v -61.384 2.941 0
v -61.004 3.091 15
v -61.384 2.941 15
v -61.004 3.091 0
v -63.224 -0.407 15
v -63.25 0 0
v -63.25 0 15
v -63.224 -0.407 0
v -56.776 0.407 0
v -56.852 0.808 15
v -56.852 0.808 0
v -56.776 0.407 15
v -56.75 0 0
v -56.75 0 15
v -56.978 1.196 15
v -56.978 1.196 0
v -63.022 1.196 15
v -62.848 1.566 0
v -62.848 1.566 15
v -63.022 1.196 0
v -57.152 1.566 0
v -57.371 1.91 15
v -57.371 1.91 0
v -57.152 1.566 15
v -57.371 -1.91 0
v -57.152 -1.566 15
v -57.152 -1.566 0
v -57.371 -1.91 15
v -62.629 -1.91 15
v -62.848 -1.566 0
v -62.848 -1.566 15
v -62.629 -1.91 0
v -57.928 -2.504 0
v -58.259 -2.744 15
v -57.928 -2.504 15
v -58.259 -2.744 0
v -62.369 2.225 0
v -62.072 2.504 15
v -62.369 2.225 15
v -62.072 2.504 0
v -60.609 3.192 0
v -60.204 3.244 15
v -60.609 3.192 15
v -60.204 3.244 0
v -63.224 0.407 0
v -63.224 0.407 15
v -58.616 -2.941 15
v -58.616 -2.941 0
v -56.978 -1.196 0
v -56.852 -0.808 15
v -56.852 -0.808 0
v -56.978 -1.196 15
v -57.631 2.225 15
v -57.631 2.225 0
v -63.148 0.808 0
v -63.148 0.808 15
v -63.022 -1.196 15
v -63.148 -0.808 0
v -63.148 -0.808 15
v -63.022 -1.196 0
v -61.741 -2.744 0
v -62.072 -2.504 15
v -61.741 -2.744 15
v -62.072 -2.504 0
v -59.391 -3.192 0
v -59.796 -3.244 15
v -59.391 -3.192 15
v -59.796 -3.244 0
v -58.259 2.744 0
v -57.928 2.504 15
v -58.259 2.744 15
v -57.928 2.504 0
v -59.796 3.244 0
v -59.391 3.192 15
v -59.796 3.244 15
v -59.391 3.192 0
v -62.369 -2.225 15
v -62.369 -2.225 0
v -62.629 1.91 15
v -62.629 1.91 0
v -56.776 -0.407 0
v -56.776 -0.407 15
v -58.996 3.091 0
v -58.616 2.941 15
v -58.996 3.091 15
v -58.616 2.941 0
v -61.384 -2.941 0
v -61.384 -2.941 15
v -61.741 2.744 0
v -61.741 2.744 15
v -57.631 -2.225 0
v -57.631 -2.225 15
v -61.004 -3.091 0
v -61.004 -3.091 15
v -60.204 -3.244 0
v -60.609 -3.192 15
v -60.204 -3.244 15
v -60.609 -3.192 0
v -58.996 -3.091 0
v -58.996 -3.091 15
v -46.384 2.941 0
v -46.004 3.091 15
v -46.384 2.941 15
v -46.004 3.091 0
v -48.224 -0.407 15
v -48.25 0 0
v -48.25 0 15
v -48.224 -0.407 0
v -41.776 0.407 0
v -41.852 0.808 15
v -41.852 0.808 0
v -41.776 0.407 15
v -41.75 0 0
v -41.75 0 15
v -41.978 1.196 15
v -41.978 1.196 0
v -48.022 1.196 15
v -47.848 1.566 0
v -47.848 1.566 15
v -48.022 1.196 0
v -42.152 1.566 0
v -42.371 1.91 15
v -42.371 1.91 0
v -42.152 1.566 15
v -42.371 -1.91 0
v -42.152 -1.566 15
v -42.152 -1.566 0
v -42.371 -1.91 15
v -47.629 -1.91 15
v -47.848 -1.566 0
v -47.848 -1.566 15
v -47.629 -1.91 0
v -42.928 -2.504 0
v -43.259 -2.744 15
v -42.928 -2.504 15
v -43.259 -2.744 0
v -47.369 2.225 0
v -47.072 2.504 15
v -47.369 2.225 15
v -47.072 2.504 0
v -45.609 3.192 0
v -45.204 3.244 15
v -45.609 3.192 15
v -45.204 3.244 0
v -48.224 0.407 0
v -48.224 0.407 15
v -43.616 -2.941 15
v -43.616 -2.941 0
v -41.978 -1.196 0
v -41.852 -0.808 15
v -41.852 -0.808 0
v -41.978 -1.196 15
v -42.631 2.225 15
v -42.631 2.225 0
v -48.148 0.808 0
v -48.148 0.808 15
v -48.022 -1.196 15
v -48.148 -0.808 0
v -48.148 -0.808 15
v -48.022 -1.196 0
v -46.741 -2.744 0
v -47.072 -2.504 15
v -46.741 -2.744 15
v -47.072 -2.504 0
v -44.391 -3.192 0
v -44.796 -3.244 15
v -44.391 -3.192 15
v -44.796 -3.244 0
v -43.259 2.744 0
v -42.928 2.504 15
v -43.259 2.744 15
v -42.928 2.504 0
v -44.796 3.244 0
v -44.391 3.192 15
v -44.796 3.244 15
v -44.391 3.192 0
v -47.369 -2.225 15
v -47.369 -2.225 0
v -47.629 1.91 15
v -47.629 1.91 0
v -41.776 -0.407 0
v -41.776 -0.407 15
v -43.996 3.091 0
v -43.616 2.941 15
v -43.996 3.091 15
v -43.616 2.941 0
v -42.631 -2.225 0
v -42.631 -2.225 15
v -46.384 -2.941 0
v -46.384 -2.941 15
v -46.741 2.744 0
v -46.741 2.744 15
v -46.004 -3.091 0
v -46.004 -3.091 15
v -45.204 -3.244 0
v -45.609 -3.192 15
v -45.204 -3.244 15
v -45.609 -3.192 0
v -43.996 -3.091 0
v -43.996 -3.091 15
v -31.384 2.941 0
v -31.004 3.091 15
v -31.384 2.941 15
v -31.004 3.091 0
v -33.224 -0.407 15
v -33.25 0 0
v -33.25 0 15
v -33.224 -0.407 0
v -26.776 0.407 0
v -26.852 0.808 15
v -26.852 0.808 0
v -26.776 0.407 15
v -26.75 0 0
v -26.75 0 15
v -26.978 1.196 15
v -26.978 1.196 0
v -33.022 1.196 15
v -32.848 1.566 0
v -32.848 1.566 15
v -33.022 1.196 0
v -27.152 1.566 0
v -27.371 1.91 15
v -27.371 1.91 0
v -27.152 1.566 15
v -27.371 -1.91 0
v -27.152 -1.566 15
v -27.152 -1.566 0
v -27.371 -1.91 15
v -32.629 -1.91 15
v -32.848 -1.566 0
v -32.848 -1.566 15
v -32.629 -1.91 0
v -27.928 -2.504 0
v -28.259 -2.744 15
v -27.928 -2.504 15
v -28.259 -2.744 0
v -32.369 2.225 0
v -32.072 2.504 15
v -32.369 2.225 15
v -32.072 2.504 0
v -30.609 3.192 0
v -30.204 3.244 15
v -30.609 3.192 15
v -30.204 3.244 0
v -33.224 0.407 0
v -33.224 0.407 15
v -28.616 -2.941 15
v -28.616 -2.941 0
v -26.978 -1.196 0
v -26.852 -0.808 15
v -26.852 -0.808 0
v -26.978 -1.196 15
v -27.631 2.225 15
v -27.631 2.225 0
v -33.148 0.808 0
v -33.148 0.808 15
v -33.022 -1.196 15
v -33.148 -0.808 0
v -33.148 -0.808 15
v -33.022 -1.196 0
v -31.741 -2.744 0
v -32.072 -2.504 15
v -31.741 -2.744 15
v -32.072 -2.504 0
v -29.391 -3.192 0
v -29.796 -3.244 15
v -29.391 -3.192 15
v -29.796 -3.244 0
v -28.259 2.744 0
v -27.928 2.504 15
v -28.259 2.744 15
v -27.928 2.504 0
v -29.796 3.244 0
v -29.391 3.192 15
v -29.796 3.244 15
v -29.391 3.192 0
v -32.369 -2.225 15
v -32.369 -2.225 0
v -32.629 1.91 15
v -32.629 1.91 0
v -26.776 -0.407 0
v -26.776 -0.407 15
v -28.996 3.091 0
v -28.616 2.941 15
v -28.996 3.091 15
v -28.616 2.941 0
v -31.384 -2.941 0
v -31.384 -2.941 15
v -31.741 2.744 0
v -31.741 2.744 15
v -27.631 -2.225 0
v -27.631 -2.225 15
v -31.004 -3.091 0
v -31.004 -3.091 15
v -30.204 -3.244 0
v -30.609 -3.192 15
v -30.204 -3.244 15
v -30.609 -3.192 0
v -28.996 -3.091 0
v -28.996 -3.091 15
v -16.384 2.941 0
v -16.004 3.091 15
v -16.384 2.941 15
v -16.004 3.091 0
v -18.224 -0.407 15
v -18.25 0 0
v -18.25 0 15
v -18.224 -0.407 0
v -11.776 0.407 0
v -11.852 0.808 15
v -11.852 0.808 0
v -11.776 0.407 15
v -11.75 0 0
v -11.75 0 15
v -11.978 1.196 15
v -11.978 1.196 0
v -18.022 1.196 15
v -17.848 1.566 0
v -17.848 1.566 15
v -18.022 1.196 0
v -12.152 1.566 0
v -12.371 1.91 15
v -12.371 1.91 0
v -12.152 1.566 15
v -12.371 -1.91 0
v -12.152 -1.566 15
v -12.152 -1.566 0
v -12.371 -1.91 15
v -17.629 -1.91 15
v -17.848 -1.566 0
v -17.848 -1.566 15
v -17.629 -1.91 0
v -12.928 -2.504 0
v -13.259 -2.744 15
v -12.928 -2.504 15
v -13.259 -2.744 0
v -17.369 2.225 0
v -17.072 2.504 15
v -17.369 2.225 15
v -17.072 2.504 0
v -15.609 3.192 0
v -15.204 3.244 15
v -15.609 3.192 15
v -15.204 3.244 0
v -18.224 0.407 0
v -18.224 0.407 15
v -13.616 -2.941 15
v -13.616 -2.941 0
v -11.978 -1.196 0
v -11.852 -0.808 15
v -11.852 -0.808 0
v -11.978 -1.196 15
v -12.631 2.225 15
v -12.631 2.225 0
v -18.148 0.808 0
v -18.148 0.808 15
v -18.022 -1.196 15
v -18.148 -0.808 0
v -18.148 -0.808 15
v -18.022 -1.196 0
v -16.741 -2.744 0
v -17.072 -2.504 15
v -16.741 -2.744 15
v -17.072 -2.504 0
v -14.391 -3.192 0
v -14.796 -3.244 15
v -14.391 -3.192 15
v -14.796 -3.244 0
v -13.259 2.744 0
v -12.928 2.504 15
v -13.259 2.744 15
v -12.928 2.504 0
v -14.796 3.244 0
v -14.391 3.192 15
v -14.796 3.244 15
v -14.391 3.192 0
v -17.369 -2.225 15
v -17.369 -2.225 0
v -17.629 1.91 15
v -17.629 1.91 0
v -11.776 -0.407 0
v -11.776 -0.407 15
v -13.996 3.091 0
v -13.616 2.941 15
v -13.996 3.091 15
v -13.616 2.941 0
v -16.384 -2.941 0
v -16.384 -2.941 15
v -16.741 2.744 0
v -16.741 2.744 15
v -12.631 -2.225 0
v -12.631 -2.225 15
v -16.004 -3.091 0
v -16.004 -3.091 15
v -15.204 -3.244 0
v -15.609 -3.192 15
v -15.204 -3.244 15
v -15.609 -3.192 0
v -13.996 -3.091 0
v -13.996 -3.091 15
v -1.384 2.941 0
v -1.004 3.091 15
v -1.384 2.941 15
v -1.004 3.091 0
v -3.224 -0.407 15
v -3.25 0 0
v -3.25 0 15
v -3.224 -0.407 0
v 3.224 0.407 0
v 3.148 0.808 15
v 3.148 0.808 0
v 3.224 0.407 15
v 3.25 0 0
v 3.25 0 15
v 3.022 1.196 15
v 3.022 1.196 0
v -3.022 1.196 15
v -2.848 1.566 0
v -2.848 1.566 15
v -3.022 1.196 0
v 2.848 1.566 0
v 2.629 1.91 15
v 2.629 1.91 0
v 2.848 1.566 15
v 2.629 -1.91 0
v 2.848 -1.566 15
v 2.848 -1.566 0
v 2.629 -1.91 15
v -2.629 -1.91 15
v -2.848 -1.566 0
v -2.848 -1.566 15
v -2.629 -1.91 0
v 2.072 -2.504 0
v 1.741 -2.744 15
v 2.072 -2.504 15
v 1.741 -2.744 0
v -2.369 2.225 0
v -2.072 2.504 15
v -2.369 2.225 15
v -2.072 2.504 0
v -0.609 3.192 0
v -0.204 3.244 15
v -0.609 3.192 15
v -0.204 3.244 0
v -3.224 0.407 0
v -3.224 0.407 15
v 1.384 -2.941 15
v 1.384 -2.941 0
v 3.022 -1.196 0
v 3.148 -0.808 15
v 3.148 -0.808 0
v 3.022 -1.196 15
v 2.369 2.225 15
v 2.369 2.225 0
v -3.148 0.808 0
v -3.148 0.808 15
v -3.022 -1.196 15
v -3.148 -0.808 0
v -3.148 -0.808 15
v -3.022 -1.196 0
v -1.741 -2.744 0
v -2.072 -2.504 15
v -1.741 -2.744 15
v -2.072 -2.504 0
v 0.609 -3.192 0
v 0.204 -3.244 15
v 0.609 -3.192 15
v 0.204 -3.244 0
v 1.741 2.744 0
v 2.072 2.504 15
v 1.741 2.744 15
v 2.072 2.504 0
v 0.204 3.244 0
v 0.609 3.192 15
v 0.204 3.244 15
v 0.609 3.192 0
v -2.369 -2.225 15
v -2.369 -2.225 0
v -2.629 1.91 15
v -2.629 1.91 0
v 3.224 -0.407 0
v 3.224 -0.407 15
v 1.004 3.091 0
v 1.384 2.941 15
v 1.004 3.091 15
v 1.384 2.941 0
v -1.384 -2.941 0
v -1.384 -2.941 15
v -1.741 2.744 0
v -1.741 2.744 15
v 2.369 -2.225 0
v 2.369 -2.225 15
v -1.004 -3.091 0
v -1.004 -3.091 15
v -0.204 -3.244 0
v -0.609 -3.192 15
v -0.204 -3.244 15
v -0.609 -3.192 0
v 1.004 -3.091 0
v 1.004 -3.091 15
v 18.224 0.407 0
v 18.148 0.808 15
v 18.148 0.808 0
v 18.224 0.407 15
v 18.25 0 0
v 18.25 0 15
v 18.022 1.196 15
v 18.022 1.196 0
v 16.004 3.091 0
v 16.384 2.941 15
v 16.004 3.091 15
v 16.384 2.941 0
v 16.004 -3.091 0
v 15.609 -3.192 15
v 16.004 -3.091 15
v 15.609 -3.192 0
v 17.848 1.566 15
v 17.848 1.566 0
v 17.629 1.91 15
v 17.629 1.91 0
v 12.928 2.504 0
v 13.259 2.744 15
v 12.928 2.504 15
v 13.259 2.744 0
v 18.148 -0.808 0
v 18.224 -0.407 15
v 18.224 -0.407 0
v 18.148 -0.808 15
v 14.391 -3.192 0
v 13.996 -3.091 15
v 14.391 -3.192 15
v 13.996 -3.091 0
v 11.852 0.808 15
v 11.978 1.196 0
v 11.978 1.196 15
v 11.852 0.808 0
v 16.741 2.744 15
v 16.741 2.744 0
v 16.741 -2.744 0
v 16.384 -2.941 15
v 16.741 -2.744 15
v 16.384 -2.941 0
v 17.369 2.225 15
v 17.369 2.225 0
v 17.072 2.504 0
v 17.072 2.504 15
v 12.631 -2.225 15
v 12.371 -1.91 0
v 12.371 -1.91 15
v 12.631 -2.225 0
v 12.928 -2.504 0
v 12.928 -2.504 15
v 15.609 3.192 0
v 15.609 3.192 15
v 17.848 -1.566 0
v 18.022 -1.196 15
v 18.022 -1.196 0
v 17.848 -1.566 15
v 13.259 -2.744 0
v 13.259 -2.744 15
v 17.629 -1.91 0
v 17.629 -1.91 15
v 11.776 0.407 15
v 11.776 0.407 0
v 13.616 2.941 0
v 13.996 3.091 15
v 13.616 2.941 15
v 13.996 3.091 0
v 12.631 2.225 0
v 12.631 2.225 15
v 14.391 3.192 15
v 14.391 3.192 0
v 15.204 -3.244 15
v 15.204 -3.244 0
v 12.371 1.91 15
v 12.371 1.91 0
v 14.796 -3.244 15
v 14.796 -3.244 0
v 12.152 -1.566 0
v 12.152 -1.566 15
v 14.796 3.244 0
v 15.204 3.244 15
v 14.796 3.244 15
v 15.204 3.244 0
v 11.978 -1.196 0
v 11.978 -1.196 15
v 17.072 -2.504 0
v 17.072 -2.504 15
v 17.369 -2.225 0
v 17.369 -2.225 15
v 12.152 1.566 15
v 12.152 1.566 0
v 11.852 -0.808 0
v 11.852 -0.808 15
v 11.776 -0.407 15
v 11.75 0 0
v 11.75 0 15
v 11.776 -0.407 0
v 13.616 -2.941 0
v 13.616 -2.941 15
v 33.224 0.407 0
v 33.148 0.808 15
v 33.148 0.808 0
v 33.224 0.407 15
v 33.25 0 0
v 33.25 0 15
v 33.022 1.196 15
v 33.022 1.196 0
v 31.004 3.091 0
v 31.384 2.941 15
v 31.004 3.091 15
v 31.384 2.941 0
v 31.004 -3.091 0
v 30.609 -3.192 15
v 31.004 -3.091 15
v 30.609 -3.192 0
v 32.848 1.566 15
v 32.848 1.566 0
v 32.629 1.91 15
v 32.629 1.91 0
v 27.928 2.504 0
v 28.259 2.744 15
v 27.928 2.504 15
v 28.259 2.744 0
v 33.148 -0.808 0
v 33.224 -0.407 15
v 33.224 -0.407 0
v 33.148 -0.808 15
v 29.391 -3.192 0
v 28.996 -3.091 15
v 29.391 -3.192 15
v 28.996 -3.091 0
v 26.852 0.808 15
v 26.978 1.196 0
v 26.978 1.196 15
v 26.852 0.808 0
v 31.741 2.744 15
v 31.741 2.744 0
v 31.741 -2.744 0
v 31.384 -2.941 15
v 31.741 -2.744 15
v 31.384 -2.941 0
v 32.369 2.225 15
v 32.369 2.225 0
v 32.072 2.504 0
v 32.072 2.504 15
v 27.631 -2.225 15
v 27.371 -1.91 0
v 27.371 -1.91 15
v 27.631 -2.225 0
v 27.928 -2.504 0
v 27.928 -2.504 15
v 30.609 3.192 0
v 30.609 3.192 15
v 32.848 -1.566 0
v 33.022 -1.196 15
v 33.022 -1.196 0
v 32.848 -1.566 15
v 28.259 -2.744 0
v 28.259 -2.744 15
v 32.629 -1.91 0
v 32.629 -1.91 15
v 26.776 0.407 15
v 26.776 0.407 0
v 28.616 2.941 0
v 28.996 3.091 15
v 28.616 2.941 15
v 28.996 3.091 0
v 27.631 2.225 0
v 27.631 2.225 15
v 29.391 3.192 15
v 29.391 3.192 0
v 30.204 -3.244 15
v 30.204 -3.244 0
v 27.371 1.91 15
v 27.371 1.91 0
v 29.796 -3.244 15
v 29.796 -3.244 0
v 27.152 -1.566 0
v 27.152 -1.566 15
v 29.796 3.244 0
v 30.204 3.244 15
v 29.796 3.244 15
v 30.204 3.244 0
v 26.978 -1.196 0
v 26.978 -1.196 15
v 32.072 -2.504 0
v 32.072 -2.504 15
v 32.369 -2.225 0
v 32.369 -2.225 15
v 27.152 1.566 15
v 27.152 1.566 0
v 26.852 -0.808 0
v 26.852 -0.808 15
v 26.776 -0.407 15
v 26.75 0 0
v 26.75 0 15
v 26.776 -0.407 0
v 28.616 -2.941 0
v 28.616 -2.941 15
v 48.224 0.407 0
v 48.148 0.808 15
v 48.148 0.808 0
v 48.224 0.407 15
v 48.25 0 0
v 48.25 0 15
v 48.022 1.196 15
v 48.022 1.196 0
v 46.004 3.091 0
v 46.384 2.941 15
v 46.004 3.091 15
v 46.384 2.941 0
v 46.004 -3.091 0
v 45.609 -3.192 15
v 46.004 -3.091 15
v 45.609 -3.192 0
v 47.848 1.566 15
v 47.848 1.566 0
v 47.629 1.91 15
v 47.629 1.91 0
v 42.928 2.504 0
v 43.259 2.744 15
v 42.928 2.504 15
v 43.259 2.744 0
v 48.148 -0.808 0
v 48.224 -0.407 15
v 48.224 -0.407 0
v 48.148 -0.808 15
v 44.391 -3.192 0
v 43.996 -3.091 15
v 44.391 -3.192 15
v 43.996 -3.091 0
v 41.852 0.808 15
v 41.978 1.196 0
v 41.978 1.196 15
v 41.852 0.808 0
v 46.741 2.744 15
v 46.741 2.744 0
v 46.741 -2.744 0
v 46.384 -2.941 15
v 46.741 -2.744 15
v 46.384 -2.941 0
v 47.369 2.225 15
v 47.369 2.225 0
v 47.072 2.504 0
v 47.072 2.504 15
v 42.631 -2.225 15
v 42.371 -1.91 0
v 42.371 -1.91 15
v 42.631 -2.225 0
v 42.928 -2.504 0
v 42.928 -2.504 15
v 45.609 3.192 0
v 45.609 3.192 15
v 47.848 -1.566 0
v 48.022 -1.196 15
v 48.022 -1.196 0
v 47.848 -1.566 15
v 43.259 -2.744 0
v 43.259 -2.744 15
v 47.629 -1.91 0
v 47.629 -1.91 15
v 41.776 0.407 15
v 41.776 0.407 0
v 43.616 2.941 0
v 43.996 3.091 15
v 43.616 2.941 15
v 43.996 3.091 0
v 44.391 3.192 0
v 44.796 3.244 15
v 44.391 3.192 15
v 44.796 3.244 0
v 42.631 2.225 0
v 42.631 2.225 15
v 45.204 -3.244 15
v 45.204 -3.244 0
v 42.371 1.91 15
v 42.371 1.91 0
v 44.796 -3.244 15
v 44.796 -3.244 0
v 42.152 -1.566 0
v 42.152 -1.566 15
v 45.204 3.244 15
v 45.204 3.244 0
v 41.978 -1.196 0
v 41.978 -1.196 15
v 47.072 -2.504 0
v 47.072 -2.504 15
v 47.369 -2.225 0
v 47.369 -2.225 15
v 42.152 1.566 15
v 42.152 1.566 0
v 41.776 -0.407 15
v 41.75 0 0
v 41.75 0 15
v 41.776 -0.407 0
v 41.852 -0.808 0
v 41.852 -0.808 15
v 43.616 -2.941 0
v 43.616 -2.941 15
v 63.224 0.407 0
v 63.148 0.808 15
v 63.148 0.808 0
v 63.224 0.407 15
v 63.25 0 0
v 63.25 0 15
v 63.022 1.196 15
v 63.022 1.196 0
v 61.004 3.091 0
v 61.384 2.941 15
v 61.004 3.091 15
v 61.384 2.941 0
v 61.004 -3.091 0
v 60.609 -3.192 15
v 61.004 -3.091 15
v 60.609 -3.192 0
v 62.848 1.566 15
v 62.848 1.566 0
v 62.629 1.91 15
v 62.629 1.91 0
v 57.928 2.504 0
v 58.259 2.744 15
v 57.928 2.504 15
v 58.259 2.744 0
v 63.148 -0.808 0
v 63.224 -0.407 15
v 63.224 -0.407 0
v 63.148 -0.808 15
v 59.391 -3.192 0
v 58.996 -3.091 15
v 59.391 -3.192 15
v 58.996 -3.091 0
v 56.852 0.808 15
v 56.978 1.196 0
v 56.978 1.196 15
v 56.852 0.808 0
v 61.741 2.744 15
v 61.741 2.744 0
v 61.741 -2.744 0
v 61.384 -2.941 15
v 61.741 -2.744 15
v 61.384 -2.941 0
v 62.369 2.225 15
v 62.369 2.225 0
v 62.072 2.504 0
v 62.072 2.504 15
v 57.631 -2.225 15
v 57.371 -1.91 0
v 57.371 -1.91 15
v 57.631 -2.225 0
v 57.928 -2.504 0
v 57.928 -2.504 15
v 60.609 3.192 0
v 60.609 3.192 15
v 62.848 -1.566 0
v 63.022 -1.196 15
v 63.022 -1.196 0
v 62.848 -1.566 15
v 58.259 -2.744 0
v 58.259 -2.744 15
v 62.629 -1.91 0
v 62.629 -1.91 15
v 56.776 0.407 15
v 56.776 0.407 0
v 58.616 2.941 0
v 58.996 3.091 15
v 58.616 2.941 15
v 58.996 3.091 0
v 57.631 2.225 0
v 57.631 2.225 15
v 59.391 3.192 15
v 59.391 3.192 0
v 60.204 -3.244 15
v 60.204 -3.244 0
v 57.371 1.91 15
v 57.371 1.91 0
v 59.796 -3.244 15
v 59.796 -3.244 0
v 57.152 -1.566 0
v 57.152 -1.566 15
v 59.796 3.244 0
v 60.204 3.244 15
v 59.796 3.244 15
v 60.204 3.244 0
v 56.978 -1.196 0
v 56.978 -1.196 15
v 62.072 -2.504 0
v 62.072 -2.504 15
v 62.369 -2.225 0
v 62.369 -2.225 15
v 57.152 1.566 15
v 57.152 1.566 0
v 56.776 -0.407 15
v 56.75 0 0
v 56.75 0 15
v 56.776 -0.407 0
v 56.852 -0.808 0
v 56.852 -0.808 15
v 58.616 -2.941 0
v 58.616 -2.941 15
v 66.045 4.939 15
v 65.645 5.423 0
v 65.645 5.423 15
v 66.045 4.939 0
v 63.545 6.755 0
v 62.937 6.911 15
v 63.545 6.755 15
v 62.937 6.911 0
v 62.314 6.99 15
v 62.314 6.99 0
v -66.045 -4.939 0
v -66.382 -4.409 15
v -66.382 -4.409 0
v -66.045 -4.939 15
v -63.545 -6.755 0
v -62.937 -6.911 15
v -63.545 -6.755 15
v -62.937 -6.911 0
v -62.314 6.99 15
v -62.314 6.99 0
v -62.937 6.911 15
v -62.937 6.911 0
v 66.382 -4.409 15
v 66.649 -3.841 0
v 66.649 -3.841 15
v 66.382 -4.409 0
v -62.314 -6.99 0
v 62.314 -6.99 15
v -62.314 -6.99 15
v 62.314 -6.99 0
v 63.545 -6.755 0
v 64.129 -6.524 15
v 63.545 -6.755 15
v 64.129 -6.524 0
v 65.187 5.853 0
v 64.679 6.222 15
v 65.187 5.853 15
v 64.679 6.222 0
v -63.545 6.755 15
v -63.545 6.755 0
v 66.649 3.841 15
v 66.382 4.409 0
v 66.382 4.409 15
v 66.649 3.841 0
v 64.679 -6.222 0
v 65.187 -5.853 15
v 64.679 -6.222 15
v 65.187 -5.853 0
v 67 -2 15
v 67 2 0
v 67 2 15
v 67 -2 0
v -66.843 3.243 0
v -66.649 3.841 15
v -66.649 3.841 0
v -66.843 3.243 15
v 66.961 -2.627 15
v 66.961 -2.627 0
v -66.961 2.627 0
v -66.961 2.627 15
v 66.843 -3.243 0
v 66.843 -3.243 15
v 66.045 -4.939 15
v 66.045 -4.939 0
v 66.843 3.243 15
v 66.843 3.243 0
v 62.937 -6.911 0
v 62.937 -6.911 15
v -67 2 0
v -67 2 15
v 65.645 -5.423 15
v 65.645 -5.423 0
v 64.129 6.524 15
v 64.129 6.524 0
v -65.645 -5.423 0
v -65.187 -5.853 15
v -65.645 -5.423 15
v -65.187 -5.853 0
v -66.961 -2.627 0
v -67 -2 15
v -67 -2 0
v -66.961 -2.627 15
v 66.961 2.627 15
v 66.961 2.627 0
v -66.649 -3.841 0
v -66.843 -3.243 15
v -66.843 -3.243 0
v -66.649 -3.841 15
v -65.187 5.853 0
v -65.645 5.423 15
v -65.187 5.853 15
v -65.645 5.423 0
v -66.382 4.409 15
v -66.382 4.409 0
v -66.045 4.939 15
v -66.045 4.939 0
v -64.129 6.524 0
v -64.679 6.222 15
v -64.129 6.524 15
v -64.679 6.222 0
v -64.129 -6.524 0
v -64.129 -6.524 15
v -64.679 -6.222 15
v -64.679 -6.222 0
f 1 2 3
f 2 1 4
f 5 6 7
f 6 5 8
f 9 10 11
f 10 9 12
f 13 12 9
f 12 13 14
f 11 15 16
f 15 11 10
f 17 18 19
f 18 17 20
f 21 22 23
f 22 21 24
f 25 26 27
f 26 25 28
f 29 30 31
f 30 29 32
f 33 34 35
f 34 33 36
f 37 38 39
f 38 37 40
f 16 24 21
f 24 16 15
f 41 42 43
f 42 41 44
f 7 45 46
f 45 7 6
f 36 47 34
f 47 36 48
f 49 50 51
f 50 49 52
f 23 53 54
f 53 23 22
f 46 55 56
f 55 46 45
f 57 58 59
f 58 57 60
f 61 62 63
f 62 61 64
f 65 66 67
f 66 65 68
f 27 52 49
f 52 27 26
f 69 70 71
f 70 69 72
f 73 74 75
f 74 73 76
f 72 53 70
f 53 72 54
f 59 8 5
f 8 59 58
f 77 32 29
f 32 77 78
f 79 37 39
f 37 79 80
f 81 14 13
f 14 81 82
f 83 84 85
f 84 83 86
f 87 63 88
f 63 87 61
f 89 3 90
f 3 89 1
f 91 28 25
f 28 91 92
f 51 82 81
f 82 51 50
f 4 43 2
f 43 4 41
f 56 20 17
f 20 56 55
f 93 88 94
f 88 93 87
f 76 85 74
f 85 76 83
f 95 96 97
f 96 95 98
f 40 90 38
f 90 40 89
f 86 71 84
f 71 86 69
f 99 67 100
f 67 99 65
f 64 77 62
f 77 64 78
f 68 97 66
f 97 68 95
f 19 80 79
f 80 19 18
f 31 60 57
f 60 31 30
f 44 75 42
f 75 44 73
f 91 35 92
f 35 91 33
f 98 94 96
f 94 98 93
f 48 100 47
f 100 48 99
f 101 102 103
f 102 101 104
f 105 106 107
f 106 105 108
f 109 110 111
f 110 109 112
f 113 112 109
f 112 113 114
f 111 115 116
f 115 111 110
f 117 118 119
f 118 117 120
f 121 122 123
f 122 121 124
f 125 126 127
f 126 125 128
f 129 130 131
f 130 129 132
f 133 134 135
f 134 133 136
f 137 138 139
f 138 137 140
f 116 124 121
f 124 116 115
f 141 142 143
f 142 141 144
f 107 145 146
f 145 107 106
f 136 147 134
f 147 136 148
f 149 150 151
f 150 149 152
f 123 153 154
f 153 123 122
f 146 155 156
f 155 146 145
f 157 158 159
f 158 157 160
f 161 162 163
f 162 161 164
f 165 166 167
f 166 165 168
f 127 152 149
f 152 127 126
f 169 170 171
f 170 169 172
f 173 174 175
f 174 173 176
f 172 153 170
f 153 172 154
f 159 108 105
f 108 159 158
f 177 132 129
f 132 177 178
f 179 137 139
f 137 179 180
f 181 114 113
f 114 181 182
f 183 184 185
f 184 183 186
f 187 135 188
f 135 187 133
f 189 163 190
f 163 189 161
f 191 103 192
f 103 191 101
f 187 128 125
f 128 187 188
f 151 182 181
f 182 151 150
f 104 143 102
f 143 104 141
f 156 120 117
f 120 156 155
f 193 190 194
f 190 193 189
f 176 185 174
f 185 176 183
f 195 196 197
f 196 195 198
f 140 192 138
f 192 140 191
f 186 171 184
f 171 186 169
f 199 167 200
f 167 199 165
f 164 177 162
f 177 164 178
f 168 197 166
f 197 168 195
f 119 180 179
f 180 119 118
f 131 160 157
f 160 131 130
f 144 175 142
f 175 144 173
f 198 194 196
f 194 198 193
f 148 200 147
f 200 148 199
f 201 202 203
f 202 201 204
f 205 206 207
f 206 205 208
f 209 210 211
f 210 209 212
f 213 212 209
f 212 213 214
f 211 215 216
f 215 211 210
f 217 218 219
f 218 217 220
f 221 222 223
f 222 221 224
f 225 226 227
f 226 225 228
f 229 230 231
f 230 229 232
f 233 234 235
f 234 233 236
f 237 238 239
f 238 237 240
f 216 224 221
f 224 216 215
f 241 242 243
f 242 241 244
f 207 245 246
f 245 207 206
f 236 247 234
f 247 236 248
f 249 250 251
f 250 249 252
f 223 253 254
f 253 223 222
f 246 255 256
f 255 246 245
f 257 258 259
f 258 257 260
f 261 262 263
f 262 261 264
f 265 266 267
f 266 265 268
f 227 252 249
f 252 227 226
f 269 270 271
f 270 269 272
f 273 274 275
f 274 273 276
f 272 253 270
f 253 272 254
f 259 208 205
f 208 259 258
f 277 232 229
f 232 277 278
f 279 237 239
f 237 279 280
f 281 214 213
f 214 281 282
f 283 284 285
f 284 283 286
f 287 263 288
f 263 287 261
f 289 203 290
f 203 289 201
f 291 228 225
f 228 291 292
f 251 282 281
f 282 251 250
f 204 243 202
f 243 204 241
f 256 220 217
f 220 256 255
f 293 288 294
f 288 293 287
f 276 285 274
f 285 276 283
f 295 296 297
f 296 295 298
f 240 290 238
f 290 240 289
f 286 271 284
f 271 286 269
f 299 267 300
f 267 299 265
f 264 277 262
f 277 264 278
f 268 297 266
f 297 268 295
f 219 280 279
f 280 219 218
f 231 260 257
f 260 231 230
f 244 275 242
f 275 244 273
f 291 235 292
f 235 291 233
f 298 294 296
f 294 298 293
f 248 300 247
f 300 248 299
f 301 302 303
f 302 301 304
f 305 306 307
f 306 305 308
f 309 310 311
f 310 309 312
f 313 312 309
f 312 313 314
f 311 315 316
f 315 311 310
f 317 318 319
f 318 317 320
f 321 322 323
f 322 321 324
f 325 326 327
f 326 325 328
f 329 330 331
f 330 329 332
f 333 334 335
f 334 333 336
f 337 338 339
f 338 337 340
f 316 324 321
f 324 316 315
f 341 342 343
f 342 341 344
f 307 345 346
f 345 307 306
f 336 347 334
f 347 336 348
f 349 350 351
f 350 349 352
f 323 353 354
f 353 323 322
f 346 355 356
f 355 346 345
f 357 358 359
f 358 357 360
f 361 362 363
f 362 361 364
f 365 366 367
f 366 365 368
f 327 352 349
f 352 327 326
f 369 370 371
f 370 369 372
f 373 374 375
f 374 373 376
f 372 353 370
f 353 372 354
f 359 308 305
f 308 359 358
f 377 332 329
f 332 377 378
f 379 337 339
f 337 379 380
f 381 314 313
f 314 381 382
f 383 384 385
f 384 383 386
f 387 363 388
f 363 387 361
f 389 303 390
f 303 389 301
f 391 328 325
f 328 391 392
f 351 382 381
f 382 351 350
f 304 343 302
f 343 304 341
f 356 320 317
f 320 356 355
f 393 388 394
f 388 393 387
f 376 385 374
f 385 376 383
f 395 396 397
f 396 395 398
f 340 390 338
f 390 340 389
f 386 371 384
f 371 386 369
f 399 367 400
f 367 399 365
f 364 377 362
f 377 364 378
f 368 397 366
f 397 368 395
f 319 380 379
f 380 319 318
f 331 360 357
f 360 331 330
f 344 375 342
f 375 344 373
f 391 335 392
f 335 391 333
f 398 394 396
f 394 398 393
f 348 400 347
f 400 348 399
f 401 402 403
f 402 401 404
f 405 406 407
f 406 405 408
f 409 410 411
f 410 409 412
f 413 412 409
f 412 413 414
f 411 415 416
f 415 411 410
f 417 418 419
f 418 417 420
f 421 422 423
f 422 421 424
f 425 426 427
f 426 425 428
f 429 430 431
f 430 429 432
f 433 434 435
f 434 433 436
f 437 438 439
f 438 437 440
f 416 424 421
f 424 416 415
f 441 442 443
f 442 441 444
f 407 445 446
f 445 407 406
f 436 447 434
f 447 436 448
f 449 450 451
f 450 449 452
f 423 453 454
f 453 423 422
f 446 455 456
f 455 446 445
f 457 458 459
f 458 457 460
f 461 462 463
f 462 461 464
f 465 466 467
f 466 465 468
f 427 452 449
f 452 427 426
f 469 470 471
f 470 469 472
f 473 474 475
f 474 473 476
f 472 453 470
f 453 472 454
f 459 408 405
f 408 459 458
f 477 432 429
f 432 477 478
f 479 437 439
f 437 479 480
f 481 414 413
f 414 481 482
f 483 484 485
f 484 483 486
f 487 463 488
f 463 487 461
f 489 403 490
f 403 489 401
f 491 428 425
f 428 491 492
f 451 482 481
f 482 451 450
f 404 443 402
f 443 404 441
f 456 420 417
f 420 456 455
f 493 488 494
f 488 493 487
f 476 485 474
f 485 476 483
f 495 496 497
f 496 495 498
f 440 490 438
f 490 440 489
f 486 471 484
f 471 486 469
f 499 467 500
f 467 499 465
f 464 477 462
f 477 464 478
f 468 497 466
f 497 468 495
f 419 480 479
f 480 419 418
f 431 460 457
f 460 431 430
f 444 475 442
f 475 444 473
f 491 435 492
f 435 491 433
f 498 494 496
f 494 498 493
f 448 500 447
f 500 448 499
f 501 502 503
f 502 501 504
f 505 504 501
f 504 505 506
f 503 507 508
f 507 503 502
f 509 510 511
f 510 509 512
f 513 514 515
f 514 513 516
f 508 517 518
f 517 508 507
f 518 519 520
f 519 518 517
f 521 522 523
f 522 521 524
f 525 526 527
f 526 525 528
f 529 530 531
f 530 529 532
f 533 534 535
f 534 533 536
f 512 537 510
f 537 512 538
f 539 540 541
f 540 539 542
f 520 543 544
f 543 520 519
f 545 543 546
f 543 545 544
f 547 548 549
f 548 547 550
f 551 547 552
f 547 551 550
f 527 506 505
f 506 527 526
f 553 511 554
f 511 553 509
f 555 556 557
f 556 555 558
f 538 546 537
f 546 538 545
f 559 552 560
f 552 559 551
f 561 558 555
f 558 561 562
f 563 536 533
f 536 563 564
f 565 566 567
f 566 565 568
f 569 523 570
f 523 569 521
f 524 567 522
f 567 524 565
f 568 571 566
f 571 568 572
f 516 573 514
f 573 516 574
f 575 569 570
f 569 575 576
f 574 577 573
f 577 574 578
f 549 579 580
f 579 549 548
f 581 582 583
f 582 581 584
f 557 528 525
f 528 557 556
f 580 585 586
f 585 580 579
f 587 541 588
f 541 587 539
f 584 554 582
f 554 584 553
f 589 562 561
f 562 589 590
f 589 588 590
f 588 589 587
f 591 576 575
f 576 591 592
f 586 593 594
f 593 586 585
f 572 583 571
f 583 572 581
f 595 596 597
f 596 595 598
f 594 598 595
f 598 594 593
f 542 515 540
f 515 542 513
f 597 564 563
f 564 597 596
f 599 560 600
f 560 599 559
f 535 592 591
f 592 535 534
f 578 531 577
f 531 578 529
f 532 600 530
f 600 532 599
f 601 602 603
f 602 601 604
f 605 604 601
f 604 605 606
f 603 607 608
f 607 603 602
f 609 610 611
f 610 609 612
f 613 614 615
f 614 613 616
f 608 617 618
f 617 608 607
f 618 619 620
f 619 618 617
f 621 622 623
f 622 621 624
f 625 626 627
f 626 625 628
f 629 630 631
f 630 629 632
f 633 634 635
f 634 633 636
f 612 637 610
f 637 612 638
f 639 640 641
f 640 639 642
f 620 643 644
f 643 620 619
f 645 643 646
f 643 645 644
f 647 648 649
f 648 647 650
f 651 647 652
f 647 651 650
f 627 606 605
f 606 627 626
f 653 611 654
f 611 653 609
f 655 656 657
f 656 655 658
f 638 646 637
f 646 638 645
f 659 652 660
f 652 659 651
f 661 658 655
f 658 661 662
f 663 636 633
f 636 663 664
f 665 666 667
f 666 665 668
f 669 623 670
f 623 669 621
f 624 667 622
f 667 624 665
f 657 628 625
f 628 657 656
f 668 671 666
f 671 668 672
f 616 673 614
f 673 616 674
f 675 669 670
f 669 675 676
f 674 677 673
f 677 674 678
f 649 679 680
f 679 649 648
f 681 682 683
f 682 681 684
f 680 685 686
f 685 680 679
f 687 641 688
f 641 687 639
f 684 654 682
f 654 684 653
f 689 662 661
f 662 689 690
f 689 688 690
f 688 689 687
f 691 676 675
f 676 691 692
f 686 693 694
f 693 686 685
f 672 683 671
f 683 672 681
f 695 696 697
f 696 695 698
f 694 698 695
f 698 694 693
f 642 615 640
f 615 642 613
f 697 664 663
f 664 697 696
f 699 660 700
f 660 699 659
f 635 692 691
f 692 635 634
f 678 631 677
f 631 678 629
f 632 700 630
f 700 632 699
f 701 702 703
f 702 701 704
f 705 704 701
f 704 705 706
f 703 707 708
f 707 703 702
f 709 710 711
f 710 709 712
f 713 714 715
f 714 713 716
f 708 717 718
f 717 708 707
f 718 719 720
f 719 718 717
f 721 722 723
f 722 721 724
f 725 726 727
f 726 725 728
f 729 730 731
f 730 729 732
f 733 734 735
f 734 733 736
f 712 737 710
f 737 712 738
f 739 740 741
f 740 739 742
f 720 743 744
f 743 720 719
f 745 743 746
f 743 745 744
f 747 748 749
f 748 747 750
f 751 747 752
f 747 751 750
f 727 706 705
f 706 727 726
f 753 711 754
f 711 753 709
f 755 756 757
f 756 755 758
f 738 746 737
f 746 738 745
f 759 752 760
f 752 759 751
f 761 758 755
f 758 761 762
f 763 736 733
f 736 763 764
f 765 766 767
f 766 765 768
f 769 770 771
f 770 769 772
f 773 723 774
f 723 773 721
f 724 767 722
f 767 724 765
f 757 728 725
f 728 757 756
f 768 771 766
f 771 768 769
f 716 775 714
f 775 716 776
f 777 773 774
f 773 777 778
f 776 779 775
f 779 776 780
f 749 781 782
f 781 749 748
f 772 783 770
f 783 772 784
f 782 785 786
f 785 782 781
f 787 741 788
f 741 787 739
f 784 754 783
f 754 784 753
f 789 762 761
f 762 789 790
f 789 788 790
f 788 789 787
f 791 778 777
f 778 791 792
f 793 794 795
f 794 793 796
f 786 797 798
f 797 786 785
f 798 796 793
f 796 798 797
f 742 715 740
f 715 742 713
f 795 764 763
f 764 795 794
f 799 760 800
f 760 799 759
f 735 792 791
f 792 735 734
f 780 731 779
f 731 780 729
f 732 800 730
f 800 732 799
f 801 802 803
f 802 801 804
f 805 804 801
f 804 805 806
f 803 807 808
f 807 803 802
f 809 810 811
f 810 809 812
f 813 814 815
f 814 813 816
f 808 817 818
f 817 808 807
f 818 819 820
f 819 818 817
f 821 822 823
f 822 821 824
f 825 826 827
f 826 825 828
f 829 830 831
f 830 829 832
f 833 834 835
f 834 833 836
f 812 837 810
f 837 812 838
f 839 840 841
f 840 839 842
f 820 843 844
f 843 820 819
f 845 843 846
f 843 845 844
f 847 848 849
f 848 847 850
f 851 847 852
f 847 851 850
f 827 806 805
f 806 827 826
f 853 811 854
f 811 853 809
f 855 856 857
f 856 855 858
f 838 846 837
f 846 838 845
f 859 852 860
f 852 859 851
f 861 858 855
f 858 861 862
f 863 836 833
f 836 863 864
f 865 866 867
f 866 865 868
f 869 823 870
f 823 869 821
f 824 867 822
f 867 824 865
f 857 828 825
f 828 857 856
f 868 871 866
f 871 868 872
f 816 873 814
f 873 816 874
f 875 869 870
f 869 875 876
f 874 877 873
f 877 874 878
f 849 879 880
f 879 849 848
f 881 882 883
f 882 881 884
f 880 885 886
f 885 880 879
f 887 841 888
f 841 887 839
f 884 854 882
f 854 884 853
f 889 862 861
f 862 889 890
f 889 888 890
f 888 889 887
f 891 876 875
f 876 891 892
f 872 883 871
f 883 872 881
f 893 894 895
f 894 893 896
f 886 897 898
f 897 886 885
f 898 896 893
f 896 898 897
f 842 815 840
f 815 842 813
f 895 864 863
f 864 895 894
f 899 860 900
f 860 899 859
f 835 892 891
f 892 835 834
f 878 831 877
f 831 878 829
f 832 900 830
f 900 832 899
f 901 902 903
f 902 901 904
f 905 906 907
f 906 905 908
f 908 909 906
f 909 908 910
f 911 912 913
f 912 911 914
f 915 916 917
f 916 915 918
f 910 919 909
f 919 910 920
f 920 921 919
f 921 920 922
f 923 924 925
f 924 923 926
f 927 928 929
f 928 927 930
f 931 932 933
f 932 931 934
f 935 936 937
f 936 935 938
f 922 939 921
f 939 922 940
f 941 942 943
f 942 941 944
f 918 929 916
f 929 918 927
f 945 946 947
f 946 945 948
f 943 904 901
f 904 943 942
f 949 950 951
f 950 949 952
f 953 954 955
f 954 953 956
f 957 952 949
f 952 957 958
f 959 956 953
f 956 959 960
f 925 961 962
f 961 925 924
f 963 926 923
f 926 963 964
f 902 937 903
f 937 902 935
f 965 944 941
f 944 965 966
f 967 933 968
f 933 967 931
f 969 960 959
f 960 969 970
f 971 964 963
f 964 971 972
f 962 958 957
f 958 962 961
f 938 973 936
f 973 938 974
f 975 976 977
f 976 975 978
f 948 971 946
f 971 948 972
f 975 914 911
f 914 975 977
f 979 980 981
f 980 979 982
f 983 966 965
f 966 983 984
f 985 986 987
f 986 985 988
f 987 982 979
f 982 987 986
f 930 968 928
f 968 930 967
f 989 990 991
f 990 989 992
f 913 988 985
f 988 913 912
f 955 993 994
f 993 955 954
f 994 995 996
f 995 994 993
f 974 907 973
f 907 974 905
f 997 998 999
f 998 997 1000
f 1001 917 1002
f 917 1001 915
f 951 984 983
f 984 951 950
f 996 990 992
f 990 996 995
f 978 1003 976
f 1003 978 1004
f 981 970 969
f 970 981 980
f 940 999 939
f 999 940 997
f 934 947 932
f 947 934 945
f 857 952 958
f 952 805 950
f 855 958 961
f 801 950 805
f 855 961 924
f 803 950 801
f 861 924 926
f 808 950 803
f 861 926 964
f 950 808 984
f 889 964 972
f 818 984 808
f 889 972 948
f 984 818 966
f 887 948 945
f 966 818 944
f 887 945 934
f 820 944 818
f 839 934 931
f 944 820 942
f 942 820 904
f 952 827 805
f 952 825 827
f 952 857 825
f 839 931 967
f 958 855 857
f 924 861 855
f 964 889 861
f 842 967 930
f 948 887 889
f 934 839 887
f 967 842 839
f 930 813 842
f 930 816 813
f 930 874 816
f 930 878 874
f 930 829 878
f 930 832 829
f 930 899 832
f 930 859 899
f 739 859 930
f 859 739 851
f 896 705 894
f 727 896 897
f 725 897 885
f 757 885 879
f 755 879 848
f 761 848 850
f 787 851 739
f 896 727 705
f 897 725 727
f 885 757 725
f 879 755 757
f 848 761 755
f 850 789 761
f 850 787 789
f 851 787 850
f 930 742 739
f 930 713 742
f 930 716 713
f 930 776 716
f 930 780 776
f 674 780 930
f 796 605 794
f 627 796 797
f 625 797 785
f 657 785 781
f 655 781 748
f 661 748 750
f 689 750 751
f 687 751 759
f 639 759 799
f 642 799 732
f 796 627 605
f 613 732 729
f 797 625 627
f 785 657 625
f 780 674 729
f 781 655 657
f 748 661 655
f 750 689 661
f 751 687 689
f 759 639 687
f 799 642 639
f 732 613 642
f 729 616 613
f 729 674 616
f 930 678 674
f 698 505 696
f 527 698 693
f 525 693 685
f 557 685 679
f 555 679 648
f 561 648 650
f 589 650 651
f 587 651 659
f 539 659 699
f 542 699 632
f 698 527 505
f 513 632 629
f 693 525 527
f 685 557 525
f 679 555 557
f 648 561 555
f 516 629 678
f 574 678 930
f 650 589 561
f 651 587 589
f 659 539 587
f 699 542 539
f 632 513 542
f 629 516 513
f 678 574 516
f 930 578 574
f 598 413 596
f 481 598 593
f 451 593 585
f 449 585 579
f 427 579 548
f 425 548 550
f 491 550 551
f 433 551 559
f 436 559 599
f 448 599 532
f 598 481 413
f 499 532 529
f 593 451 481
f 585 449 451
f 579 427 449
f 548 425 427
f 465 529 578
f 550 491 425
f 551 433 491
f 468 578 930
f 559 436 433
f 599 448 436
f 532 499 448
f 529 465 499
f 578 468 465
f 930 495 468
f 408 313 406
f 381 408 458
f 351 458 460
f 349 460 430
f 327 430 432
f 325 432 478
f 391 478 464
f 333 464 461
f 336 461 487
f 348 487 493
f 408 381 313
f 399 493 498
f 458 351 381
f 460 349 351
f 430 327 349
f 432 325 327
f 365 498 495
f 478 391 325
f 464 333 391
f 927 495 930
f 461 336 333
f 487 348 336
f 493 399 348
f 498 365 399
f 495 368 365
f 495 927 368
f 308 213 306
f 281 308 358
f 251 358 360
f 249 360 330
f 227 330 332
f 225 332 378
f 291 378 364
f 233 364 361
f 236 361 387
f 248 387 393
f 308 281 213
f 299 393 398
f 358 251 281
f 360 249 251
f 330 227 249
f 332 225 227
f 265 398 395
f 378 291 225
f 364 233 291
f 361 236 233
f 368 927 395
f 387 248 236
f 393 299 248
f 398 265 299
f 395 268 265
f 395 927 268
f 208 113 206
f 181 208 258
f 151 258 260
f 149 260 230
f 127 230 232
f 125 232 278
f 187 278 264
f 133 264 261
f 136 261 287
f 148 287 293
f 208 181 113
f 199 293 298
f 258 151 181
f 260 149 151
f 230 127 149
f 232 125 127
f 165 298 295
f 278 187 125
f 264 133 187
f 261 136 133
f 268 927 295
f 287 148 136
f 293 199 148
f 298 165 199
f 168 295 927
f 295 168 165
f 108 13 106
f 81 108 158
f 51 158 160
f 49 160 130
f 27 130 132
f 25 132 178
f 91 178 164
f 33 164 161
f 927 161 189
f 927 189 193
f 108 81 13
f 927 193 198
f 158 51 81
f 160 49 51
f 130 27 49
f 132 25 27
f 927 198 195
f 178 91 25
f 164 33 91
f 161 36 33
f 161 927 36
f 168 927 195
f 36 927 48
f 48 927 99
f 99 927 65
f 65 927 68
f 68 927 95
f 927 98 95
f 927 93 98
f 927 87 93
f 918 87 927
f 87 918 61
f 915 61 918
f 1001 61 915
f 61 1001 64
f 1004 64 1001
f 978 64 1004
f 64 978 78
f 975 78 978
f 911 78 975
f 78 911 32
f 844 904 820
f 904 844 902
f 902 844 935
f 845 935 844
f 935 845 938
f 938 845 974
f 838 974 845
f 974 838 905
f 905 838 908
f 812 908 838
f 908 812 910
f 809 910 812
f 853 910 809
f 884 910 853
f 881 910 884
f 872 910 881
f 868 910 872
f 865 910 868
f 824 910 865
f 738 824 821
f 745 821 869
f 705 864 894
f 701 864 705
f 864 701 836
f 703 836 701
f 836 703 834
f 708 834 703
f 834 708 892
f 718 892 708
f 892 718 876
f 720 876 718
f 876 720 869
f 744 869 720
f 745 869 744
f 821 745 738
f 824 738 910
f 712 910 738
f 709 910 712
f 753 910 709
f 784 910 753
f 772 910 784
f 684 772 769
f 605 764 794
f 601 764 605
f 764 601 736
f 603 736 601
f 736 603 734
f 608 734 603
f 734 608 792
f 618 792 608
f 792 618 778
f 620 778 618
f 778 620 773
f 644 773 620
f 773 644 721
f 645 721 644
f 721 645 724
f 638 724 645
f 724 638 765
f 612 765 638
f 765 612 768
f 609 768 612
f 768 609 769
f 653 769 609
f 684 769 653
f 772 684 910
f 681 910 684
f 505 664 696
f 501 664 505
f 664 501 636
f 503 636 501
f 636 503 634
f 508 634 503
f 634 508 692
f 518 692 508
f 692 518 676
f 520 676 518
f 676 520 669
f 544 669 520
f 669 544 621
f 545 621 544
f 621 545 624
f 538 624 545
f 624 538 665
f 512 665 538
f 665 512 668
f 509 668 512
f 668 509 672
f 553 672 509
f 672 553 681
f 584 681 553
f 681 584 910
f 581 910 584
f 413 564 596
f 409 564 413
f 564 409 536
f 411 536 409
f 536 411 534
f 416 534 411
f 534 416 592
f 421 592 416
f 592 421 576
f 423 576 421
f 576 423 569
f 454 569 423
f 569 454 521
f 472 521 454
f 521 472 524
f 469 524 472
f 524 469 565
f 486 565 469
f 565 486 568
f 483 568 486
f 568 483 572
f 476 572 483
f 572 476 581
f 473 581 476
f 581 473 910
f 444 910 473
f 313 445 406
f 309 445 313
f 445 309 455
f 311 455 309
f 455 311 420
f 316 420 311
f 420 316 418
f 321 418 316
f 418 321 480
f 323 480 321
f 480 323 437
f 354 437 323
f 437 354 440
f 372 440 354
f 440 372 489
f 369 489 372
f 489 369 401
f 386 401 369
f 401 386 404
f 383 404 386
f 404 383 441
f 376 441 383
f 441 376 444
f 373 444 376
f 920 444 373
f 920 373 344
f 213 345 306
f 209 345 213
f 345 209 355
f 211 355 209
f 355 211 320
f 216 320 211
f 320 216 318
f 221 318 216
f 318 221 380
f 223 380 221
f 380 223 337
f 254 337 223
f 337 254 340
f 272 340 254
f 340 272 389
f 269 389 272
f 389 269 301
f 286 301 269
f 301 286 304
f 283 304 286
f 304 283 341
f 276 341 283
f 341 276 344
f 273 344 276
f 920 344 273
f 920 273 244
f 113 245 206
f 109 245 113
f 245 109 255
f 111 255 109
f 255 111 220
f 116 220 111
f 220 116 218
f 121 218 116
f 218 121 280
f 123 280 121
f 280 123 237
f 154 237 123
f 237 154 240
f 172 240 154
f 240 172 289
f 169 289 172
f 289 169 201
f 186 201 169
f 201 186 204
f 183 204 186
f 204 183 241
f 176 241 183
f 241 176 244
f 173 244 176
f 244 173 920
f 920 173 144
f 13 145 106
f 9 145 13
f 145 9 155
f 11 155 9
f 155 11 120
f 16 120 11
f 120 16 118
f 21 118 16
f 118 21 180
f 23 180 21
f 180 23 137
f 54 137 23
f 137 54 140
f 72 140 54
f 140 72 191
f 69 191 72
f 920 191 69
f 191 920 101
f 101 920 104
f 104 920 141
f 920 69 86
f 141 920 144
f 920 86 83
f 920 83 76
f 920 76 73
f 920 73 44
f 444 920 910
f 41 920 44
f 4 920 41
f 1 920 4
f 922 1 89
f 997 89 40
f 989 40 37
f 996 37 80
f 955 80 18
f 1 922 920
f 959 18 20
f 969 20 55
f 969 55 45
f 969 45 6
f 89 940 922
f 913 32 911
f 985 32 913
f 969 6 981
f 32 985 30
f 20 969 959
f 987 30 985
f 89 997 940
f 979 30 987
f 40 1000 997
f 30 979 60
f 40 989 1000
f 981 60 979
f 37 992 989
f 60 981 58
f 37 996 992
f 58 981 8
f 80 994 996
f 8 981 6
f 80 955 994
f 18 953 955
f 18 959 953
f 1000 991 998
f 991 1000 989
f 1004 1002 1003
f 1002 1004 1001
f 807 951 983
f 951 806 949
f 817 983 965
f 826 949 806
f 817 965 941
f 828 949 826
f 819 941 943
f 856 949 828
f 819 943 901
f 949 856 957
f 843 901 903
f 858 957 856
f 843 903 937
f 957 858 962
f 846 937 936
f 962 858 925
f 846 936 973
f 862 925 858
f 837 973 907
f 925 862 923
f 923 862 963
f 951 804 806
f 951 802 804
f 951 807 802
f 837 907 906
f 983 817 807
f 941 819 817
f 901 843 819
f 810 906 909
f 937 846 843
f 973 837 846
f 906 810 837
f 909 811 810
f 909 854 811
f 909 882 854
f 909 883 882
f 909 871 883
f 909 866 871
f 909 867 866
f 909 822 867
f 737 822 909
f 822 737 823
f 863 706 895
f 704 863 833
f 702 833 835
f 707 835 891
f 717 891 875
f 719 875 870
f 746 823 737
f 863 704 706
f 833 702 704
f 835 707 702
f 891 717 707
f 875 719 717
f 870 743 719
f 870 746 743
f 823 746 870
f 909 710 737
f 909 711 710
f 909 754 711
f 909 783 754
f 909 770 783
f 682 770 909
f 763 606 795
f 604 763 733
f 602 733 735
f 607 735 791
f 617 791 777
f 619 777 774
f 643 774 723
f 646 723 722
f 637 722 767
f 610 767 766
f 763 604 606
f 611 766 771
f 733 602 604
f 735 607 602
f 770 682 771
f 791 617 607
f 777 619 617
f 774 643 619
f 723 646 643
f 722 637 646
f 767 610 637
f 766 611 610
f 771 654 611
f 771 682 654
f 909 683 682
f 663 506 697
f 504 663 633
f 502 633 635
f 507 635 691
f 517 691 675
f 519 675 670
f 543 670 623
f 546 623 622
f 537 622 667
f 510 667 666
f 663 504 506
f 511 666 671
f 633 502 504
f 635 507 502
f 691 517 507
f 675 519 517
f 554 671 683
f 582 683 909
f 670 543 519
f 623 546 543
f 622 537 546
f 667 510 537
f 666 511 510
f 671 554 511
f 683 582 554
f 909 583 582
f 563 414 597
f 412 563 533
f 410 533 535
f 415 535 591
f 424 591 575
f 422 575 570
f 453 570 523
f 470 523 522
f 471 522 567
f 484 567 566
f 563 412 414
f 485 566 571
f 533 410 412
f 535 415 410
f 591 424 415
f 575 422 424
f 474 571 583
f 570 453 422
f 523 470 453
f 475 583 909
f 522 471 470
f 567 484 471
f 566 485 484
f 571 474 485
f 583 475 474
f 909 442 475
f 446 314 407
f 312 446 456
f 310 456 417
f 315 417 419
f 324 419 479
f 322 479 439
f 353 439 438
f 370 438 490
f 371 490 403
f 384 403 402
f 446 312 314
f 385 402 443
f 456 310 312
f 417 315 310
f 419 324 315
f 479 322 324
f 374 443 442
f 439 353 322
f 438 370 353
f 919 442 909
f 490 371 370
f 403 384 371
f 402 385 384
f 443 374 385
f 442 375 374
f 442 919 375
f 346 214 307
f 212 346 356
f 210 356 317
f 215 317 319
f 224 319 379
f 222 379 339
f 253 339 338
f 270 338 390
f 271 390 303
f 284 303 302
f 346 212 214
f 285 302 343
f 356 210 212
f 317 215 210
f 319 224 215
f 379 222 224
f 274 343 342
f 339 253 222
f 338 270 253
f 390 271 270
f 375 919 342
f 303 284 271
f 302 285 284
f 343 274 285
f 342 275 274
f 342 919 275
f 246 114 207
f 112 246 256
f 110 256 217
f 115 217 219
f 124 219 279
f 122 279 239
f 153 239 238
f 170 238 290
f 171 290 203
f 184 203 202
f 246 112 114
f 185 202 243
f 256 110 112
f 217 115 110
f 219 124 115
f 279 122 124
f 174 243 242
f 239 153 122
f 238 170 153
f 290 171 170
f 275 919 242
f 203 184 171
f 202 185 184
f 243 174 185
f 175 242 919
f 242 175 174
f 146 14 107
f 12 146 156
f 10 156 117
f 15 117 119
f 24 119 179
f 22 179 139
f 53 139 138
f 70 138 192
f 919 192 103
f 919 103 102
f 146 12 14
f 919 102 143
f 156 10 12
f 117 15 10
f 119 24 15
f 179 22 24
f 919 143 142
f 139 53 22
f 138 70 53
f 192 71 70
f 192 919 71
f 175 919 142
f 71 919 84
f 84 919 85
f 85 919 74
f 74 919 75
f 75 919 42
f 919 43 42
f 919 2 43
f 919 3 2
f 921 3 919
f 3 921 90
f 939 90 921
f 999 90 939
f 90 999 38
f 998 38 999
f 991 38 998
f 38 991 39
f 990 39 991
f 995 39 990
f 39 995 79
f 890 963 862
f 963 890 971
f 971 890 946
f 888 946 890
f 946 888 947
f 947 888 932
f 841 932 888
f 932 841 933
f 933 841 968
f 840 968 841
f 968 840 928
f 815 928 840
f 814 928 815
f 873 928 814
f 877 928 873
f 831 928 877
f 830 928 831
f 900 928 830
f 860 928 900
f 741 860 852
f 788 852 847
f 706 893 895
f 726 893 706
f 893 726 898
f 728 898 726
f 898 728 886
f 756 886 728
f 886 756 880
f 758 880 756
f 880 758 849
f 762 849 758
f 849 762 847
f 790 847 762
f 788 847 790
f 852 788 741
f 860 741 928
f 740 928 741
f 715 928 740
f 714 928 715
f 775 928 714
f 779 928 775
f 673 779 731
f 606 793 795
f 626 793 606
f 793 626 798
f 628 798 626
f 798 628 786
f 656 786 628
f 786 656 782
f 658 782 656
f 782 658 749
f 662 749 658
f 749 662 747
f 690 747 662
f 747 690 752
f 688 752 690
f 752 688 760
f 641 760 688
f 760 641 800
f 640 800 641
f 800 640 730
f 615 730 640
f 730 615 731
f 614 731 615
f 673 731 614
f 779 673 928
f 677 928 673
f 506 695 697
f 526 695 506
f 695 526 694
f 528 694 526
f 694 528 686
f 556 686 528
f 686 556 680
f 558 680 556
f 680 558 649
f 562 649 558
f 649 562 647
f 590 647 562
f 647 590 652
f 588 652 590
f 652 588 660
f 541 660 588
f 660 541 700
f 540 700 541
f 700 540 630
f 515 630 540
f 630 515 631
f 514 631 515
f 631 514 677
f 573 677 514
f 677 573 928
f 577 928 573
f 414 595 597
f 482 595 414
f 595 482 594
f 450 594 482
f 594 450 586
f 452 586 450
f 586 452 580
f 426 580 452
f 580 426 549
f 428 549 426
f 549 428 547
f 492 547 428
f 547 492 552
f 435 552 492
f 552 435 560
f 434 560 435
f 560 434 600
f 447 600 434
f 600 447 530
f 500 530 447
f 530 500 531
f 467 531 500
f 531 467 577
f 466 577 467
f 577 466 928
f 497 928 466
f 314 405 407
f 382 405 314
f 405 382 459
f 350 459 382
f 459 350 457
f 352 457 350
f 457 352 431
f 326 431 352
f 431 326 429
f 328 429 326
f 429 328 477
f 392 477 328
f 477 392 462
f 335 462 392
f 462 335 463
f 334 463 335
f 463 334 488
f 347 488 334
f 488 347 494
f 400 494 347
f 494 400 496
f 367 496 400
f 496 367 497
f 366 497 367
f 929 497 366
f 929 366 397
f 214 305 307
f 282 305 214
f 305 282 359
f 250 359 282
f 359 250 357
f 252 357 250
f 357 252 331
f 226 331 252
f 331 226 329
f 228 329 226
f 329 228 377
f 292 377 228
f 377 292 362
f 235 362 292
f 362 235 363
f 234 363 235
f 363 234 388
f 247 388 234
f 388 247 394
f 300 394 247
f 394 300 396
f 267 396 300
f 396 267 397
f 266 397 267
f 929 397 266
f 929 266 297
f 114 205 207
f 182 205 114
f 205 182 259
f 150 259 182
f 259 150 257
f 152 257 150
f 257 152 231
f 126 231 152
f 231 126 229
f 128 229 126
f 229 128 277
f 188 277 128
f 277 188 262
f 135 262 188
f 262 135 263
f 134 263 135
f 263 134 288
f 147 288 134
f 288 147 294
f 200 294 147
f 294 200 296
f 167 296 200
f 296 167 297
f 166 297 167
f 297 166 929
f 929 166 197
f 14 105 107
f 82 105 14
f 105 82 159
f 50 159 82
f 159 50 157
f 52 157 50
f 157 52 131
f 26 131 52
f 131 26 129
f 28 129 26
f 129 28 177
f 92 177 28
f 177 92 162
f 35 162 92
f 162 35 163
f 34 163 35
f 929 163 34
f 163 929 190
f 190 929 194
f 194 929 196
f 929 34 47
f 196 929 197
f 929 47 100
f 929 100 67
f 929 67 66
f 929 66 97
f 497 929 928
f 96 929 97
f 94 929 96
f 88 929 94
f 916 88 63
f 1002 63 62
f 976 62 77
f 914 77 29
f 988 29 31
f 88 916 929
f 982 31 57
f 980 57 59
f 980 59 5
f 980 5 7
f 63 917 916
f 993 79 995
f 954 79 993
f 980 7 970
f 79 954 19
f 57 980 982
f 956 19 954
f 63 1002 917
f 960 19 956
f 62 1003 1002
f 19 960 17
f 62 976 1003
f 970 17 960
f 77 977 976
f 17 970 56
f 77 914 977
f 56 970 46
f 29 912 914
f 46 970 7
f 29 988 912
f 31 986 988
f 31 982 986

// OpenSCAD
$fn = 50;


difference() {
	union() {
		hull() {
			translate(v = [-62.0000000000, 2.0000000000, 0]) {
				cylinder(h = 15, r = 5);
			}
			translate(v = [62.0000000000, 2.0000000000, 0]) {
				cylinder(h = 15, r = 5);
			}
			translate(v = [-62.0000000000, -2.0000000000, 0]) {
				cylinder(h = 15, r = 5);
			}
			translate(v = [62.0000000000, -2.0000000000, 0]) {
				cylinder(h = 15, r = 5);
			}
		}
	}
	union() {
		translate(v = [-60.0000000000, 0.0000000000, -100.0000000000]) {
			cylinder(h = 200, r = 3.2500000000);
		}
		translate(v = [-45.0000000000, 0.0000000000, -100.0000000000]) {
			cylinder(h = 200, r = 3.2500000000);
		}
		translate(v = [-30.0000000000, 0.0000000000, -100.0000000000]) {
			cylinder(h = 200, r = 3.2500000000);
		}
		translate(v = [-15.0000000000, 0.0000000000, -100.0000000000]) {
			cylinder(h = 200, r = 3.2500000000);
		}
		translate(v = [0.0000000000, 0.0000000000, -100.0000000000]) {
			cylinder(h = 200, r = 3.2500000000);
		}
		translate(v = [15.0000000000, 0.0000000000, -100.0000000000]) {
			cylinder(h = 200, r = 3.2500000000);
		}
		translate(v = [30.0000000000, 0.0000000000, -100.0000000000]) {
			cylinder(h = 200, r = 3.2500000000);
		}
		translate(v = [45.0000000000, 0.0000000000, -100.0000000000]) {
			cylinder(h = 200, r = 3.2500000000);
		}
		translate(v = [60.0000000000, 0.0000000000, -100.0000000000]) {
			cylinder(h = 200, r = 3.2500000000);
		}
	}
}
